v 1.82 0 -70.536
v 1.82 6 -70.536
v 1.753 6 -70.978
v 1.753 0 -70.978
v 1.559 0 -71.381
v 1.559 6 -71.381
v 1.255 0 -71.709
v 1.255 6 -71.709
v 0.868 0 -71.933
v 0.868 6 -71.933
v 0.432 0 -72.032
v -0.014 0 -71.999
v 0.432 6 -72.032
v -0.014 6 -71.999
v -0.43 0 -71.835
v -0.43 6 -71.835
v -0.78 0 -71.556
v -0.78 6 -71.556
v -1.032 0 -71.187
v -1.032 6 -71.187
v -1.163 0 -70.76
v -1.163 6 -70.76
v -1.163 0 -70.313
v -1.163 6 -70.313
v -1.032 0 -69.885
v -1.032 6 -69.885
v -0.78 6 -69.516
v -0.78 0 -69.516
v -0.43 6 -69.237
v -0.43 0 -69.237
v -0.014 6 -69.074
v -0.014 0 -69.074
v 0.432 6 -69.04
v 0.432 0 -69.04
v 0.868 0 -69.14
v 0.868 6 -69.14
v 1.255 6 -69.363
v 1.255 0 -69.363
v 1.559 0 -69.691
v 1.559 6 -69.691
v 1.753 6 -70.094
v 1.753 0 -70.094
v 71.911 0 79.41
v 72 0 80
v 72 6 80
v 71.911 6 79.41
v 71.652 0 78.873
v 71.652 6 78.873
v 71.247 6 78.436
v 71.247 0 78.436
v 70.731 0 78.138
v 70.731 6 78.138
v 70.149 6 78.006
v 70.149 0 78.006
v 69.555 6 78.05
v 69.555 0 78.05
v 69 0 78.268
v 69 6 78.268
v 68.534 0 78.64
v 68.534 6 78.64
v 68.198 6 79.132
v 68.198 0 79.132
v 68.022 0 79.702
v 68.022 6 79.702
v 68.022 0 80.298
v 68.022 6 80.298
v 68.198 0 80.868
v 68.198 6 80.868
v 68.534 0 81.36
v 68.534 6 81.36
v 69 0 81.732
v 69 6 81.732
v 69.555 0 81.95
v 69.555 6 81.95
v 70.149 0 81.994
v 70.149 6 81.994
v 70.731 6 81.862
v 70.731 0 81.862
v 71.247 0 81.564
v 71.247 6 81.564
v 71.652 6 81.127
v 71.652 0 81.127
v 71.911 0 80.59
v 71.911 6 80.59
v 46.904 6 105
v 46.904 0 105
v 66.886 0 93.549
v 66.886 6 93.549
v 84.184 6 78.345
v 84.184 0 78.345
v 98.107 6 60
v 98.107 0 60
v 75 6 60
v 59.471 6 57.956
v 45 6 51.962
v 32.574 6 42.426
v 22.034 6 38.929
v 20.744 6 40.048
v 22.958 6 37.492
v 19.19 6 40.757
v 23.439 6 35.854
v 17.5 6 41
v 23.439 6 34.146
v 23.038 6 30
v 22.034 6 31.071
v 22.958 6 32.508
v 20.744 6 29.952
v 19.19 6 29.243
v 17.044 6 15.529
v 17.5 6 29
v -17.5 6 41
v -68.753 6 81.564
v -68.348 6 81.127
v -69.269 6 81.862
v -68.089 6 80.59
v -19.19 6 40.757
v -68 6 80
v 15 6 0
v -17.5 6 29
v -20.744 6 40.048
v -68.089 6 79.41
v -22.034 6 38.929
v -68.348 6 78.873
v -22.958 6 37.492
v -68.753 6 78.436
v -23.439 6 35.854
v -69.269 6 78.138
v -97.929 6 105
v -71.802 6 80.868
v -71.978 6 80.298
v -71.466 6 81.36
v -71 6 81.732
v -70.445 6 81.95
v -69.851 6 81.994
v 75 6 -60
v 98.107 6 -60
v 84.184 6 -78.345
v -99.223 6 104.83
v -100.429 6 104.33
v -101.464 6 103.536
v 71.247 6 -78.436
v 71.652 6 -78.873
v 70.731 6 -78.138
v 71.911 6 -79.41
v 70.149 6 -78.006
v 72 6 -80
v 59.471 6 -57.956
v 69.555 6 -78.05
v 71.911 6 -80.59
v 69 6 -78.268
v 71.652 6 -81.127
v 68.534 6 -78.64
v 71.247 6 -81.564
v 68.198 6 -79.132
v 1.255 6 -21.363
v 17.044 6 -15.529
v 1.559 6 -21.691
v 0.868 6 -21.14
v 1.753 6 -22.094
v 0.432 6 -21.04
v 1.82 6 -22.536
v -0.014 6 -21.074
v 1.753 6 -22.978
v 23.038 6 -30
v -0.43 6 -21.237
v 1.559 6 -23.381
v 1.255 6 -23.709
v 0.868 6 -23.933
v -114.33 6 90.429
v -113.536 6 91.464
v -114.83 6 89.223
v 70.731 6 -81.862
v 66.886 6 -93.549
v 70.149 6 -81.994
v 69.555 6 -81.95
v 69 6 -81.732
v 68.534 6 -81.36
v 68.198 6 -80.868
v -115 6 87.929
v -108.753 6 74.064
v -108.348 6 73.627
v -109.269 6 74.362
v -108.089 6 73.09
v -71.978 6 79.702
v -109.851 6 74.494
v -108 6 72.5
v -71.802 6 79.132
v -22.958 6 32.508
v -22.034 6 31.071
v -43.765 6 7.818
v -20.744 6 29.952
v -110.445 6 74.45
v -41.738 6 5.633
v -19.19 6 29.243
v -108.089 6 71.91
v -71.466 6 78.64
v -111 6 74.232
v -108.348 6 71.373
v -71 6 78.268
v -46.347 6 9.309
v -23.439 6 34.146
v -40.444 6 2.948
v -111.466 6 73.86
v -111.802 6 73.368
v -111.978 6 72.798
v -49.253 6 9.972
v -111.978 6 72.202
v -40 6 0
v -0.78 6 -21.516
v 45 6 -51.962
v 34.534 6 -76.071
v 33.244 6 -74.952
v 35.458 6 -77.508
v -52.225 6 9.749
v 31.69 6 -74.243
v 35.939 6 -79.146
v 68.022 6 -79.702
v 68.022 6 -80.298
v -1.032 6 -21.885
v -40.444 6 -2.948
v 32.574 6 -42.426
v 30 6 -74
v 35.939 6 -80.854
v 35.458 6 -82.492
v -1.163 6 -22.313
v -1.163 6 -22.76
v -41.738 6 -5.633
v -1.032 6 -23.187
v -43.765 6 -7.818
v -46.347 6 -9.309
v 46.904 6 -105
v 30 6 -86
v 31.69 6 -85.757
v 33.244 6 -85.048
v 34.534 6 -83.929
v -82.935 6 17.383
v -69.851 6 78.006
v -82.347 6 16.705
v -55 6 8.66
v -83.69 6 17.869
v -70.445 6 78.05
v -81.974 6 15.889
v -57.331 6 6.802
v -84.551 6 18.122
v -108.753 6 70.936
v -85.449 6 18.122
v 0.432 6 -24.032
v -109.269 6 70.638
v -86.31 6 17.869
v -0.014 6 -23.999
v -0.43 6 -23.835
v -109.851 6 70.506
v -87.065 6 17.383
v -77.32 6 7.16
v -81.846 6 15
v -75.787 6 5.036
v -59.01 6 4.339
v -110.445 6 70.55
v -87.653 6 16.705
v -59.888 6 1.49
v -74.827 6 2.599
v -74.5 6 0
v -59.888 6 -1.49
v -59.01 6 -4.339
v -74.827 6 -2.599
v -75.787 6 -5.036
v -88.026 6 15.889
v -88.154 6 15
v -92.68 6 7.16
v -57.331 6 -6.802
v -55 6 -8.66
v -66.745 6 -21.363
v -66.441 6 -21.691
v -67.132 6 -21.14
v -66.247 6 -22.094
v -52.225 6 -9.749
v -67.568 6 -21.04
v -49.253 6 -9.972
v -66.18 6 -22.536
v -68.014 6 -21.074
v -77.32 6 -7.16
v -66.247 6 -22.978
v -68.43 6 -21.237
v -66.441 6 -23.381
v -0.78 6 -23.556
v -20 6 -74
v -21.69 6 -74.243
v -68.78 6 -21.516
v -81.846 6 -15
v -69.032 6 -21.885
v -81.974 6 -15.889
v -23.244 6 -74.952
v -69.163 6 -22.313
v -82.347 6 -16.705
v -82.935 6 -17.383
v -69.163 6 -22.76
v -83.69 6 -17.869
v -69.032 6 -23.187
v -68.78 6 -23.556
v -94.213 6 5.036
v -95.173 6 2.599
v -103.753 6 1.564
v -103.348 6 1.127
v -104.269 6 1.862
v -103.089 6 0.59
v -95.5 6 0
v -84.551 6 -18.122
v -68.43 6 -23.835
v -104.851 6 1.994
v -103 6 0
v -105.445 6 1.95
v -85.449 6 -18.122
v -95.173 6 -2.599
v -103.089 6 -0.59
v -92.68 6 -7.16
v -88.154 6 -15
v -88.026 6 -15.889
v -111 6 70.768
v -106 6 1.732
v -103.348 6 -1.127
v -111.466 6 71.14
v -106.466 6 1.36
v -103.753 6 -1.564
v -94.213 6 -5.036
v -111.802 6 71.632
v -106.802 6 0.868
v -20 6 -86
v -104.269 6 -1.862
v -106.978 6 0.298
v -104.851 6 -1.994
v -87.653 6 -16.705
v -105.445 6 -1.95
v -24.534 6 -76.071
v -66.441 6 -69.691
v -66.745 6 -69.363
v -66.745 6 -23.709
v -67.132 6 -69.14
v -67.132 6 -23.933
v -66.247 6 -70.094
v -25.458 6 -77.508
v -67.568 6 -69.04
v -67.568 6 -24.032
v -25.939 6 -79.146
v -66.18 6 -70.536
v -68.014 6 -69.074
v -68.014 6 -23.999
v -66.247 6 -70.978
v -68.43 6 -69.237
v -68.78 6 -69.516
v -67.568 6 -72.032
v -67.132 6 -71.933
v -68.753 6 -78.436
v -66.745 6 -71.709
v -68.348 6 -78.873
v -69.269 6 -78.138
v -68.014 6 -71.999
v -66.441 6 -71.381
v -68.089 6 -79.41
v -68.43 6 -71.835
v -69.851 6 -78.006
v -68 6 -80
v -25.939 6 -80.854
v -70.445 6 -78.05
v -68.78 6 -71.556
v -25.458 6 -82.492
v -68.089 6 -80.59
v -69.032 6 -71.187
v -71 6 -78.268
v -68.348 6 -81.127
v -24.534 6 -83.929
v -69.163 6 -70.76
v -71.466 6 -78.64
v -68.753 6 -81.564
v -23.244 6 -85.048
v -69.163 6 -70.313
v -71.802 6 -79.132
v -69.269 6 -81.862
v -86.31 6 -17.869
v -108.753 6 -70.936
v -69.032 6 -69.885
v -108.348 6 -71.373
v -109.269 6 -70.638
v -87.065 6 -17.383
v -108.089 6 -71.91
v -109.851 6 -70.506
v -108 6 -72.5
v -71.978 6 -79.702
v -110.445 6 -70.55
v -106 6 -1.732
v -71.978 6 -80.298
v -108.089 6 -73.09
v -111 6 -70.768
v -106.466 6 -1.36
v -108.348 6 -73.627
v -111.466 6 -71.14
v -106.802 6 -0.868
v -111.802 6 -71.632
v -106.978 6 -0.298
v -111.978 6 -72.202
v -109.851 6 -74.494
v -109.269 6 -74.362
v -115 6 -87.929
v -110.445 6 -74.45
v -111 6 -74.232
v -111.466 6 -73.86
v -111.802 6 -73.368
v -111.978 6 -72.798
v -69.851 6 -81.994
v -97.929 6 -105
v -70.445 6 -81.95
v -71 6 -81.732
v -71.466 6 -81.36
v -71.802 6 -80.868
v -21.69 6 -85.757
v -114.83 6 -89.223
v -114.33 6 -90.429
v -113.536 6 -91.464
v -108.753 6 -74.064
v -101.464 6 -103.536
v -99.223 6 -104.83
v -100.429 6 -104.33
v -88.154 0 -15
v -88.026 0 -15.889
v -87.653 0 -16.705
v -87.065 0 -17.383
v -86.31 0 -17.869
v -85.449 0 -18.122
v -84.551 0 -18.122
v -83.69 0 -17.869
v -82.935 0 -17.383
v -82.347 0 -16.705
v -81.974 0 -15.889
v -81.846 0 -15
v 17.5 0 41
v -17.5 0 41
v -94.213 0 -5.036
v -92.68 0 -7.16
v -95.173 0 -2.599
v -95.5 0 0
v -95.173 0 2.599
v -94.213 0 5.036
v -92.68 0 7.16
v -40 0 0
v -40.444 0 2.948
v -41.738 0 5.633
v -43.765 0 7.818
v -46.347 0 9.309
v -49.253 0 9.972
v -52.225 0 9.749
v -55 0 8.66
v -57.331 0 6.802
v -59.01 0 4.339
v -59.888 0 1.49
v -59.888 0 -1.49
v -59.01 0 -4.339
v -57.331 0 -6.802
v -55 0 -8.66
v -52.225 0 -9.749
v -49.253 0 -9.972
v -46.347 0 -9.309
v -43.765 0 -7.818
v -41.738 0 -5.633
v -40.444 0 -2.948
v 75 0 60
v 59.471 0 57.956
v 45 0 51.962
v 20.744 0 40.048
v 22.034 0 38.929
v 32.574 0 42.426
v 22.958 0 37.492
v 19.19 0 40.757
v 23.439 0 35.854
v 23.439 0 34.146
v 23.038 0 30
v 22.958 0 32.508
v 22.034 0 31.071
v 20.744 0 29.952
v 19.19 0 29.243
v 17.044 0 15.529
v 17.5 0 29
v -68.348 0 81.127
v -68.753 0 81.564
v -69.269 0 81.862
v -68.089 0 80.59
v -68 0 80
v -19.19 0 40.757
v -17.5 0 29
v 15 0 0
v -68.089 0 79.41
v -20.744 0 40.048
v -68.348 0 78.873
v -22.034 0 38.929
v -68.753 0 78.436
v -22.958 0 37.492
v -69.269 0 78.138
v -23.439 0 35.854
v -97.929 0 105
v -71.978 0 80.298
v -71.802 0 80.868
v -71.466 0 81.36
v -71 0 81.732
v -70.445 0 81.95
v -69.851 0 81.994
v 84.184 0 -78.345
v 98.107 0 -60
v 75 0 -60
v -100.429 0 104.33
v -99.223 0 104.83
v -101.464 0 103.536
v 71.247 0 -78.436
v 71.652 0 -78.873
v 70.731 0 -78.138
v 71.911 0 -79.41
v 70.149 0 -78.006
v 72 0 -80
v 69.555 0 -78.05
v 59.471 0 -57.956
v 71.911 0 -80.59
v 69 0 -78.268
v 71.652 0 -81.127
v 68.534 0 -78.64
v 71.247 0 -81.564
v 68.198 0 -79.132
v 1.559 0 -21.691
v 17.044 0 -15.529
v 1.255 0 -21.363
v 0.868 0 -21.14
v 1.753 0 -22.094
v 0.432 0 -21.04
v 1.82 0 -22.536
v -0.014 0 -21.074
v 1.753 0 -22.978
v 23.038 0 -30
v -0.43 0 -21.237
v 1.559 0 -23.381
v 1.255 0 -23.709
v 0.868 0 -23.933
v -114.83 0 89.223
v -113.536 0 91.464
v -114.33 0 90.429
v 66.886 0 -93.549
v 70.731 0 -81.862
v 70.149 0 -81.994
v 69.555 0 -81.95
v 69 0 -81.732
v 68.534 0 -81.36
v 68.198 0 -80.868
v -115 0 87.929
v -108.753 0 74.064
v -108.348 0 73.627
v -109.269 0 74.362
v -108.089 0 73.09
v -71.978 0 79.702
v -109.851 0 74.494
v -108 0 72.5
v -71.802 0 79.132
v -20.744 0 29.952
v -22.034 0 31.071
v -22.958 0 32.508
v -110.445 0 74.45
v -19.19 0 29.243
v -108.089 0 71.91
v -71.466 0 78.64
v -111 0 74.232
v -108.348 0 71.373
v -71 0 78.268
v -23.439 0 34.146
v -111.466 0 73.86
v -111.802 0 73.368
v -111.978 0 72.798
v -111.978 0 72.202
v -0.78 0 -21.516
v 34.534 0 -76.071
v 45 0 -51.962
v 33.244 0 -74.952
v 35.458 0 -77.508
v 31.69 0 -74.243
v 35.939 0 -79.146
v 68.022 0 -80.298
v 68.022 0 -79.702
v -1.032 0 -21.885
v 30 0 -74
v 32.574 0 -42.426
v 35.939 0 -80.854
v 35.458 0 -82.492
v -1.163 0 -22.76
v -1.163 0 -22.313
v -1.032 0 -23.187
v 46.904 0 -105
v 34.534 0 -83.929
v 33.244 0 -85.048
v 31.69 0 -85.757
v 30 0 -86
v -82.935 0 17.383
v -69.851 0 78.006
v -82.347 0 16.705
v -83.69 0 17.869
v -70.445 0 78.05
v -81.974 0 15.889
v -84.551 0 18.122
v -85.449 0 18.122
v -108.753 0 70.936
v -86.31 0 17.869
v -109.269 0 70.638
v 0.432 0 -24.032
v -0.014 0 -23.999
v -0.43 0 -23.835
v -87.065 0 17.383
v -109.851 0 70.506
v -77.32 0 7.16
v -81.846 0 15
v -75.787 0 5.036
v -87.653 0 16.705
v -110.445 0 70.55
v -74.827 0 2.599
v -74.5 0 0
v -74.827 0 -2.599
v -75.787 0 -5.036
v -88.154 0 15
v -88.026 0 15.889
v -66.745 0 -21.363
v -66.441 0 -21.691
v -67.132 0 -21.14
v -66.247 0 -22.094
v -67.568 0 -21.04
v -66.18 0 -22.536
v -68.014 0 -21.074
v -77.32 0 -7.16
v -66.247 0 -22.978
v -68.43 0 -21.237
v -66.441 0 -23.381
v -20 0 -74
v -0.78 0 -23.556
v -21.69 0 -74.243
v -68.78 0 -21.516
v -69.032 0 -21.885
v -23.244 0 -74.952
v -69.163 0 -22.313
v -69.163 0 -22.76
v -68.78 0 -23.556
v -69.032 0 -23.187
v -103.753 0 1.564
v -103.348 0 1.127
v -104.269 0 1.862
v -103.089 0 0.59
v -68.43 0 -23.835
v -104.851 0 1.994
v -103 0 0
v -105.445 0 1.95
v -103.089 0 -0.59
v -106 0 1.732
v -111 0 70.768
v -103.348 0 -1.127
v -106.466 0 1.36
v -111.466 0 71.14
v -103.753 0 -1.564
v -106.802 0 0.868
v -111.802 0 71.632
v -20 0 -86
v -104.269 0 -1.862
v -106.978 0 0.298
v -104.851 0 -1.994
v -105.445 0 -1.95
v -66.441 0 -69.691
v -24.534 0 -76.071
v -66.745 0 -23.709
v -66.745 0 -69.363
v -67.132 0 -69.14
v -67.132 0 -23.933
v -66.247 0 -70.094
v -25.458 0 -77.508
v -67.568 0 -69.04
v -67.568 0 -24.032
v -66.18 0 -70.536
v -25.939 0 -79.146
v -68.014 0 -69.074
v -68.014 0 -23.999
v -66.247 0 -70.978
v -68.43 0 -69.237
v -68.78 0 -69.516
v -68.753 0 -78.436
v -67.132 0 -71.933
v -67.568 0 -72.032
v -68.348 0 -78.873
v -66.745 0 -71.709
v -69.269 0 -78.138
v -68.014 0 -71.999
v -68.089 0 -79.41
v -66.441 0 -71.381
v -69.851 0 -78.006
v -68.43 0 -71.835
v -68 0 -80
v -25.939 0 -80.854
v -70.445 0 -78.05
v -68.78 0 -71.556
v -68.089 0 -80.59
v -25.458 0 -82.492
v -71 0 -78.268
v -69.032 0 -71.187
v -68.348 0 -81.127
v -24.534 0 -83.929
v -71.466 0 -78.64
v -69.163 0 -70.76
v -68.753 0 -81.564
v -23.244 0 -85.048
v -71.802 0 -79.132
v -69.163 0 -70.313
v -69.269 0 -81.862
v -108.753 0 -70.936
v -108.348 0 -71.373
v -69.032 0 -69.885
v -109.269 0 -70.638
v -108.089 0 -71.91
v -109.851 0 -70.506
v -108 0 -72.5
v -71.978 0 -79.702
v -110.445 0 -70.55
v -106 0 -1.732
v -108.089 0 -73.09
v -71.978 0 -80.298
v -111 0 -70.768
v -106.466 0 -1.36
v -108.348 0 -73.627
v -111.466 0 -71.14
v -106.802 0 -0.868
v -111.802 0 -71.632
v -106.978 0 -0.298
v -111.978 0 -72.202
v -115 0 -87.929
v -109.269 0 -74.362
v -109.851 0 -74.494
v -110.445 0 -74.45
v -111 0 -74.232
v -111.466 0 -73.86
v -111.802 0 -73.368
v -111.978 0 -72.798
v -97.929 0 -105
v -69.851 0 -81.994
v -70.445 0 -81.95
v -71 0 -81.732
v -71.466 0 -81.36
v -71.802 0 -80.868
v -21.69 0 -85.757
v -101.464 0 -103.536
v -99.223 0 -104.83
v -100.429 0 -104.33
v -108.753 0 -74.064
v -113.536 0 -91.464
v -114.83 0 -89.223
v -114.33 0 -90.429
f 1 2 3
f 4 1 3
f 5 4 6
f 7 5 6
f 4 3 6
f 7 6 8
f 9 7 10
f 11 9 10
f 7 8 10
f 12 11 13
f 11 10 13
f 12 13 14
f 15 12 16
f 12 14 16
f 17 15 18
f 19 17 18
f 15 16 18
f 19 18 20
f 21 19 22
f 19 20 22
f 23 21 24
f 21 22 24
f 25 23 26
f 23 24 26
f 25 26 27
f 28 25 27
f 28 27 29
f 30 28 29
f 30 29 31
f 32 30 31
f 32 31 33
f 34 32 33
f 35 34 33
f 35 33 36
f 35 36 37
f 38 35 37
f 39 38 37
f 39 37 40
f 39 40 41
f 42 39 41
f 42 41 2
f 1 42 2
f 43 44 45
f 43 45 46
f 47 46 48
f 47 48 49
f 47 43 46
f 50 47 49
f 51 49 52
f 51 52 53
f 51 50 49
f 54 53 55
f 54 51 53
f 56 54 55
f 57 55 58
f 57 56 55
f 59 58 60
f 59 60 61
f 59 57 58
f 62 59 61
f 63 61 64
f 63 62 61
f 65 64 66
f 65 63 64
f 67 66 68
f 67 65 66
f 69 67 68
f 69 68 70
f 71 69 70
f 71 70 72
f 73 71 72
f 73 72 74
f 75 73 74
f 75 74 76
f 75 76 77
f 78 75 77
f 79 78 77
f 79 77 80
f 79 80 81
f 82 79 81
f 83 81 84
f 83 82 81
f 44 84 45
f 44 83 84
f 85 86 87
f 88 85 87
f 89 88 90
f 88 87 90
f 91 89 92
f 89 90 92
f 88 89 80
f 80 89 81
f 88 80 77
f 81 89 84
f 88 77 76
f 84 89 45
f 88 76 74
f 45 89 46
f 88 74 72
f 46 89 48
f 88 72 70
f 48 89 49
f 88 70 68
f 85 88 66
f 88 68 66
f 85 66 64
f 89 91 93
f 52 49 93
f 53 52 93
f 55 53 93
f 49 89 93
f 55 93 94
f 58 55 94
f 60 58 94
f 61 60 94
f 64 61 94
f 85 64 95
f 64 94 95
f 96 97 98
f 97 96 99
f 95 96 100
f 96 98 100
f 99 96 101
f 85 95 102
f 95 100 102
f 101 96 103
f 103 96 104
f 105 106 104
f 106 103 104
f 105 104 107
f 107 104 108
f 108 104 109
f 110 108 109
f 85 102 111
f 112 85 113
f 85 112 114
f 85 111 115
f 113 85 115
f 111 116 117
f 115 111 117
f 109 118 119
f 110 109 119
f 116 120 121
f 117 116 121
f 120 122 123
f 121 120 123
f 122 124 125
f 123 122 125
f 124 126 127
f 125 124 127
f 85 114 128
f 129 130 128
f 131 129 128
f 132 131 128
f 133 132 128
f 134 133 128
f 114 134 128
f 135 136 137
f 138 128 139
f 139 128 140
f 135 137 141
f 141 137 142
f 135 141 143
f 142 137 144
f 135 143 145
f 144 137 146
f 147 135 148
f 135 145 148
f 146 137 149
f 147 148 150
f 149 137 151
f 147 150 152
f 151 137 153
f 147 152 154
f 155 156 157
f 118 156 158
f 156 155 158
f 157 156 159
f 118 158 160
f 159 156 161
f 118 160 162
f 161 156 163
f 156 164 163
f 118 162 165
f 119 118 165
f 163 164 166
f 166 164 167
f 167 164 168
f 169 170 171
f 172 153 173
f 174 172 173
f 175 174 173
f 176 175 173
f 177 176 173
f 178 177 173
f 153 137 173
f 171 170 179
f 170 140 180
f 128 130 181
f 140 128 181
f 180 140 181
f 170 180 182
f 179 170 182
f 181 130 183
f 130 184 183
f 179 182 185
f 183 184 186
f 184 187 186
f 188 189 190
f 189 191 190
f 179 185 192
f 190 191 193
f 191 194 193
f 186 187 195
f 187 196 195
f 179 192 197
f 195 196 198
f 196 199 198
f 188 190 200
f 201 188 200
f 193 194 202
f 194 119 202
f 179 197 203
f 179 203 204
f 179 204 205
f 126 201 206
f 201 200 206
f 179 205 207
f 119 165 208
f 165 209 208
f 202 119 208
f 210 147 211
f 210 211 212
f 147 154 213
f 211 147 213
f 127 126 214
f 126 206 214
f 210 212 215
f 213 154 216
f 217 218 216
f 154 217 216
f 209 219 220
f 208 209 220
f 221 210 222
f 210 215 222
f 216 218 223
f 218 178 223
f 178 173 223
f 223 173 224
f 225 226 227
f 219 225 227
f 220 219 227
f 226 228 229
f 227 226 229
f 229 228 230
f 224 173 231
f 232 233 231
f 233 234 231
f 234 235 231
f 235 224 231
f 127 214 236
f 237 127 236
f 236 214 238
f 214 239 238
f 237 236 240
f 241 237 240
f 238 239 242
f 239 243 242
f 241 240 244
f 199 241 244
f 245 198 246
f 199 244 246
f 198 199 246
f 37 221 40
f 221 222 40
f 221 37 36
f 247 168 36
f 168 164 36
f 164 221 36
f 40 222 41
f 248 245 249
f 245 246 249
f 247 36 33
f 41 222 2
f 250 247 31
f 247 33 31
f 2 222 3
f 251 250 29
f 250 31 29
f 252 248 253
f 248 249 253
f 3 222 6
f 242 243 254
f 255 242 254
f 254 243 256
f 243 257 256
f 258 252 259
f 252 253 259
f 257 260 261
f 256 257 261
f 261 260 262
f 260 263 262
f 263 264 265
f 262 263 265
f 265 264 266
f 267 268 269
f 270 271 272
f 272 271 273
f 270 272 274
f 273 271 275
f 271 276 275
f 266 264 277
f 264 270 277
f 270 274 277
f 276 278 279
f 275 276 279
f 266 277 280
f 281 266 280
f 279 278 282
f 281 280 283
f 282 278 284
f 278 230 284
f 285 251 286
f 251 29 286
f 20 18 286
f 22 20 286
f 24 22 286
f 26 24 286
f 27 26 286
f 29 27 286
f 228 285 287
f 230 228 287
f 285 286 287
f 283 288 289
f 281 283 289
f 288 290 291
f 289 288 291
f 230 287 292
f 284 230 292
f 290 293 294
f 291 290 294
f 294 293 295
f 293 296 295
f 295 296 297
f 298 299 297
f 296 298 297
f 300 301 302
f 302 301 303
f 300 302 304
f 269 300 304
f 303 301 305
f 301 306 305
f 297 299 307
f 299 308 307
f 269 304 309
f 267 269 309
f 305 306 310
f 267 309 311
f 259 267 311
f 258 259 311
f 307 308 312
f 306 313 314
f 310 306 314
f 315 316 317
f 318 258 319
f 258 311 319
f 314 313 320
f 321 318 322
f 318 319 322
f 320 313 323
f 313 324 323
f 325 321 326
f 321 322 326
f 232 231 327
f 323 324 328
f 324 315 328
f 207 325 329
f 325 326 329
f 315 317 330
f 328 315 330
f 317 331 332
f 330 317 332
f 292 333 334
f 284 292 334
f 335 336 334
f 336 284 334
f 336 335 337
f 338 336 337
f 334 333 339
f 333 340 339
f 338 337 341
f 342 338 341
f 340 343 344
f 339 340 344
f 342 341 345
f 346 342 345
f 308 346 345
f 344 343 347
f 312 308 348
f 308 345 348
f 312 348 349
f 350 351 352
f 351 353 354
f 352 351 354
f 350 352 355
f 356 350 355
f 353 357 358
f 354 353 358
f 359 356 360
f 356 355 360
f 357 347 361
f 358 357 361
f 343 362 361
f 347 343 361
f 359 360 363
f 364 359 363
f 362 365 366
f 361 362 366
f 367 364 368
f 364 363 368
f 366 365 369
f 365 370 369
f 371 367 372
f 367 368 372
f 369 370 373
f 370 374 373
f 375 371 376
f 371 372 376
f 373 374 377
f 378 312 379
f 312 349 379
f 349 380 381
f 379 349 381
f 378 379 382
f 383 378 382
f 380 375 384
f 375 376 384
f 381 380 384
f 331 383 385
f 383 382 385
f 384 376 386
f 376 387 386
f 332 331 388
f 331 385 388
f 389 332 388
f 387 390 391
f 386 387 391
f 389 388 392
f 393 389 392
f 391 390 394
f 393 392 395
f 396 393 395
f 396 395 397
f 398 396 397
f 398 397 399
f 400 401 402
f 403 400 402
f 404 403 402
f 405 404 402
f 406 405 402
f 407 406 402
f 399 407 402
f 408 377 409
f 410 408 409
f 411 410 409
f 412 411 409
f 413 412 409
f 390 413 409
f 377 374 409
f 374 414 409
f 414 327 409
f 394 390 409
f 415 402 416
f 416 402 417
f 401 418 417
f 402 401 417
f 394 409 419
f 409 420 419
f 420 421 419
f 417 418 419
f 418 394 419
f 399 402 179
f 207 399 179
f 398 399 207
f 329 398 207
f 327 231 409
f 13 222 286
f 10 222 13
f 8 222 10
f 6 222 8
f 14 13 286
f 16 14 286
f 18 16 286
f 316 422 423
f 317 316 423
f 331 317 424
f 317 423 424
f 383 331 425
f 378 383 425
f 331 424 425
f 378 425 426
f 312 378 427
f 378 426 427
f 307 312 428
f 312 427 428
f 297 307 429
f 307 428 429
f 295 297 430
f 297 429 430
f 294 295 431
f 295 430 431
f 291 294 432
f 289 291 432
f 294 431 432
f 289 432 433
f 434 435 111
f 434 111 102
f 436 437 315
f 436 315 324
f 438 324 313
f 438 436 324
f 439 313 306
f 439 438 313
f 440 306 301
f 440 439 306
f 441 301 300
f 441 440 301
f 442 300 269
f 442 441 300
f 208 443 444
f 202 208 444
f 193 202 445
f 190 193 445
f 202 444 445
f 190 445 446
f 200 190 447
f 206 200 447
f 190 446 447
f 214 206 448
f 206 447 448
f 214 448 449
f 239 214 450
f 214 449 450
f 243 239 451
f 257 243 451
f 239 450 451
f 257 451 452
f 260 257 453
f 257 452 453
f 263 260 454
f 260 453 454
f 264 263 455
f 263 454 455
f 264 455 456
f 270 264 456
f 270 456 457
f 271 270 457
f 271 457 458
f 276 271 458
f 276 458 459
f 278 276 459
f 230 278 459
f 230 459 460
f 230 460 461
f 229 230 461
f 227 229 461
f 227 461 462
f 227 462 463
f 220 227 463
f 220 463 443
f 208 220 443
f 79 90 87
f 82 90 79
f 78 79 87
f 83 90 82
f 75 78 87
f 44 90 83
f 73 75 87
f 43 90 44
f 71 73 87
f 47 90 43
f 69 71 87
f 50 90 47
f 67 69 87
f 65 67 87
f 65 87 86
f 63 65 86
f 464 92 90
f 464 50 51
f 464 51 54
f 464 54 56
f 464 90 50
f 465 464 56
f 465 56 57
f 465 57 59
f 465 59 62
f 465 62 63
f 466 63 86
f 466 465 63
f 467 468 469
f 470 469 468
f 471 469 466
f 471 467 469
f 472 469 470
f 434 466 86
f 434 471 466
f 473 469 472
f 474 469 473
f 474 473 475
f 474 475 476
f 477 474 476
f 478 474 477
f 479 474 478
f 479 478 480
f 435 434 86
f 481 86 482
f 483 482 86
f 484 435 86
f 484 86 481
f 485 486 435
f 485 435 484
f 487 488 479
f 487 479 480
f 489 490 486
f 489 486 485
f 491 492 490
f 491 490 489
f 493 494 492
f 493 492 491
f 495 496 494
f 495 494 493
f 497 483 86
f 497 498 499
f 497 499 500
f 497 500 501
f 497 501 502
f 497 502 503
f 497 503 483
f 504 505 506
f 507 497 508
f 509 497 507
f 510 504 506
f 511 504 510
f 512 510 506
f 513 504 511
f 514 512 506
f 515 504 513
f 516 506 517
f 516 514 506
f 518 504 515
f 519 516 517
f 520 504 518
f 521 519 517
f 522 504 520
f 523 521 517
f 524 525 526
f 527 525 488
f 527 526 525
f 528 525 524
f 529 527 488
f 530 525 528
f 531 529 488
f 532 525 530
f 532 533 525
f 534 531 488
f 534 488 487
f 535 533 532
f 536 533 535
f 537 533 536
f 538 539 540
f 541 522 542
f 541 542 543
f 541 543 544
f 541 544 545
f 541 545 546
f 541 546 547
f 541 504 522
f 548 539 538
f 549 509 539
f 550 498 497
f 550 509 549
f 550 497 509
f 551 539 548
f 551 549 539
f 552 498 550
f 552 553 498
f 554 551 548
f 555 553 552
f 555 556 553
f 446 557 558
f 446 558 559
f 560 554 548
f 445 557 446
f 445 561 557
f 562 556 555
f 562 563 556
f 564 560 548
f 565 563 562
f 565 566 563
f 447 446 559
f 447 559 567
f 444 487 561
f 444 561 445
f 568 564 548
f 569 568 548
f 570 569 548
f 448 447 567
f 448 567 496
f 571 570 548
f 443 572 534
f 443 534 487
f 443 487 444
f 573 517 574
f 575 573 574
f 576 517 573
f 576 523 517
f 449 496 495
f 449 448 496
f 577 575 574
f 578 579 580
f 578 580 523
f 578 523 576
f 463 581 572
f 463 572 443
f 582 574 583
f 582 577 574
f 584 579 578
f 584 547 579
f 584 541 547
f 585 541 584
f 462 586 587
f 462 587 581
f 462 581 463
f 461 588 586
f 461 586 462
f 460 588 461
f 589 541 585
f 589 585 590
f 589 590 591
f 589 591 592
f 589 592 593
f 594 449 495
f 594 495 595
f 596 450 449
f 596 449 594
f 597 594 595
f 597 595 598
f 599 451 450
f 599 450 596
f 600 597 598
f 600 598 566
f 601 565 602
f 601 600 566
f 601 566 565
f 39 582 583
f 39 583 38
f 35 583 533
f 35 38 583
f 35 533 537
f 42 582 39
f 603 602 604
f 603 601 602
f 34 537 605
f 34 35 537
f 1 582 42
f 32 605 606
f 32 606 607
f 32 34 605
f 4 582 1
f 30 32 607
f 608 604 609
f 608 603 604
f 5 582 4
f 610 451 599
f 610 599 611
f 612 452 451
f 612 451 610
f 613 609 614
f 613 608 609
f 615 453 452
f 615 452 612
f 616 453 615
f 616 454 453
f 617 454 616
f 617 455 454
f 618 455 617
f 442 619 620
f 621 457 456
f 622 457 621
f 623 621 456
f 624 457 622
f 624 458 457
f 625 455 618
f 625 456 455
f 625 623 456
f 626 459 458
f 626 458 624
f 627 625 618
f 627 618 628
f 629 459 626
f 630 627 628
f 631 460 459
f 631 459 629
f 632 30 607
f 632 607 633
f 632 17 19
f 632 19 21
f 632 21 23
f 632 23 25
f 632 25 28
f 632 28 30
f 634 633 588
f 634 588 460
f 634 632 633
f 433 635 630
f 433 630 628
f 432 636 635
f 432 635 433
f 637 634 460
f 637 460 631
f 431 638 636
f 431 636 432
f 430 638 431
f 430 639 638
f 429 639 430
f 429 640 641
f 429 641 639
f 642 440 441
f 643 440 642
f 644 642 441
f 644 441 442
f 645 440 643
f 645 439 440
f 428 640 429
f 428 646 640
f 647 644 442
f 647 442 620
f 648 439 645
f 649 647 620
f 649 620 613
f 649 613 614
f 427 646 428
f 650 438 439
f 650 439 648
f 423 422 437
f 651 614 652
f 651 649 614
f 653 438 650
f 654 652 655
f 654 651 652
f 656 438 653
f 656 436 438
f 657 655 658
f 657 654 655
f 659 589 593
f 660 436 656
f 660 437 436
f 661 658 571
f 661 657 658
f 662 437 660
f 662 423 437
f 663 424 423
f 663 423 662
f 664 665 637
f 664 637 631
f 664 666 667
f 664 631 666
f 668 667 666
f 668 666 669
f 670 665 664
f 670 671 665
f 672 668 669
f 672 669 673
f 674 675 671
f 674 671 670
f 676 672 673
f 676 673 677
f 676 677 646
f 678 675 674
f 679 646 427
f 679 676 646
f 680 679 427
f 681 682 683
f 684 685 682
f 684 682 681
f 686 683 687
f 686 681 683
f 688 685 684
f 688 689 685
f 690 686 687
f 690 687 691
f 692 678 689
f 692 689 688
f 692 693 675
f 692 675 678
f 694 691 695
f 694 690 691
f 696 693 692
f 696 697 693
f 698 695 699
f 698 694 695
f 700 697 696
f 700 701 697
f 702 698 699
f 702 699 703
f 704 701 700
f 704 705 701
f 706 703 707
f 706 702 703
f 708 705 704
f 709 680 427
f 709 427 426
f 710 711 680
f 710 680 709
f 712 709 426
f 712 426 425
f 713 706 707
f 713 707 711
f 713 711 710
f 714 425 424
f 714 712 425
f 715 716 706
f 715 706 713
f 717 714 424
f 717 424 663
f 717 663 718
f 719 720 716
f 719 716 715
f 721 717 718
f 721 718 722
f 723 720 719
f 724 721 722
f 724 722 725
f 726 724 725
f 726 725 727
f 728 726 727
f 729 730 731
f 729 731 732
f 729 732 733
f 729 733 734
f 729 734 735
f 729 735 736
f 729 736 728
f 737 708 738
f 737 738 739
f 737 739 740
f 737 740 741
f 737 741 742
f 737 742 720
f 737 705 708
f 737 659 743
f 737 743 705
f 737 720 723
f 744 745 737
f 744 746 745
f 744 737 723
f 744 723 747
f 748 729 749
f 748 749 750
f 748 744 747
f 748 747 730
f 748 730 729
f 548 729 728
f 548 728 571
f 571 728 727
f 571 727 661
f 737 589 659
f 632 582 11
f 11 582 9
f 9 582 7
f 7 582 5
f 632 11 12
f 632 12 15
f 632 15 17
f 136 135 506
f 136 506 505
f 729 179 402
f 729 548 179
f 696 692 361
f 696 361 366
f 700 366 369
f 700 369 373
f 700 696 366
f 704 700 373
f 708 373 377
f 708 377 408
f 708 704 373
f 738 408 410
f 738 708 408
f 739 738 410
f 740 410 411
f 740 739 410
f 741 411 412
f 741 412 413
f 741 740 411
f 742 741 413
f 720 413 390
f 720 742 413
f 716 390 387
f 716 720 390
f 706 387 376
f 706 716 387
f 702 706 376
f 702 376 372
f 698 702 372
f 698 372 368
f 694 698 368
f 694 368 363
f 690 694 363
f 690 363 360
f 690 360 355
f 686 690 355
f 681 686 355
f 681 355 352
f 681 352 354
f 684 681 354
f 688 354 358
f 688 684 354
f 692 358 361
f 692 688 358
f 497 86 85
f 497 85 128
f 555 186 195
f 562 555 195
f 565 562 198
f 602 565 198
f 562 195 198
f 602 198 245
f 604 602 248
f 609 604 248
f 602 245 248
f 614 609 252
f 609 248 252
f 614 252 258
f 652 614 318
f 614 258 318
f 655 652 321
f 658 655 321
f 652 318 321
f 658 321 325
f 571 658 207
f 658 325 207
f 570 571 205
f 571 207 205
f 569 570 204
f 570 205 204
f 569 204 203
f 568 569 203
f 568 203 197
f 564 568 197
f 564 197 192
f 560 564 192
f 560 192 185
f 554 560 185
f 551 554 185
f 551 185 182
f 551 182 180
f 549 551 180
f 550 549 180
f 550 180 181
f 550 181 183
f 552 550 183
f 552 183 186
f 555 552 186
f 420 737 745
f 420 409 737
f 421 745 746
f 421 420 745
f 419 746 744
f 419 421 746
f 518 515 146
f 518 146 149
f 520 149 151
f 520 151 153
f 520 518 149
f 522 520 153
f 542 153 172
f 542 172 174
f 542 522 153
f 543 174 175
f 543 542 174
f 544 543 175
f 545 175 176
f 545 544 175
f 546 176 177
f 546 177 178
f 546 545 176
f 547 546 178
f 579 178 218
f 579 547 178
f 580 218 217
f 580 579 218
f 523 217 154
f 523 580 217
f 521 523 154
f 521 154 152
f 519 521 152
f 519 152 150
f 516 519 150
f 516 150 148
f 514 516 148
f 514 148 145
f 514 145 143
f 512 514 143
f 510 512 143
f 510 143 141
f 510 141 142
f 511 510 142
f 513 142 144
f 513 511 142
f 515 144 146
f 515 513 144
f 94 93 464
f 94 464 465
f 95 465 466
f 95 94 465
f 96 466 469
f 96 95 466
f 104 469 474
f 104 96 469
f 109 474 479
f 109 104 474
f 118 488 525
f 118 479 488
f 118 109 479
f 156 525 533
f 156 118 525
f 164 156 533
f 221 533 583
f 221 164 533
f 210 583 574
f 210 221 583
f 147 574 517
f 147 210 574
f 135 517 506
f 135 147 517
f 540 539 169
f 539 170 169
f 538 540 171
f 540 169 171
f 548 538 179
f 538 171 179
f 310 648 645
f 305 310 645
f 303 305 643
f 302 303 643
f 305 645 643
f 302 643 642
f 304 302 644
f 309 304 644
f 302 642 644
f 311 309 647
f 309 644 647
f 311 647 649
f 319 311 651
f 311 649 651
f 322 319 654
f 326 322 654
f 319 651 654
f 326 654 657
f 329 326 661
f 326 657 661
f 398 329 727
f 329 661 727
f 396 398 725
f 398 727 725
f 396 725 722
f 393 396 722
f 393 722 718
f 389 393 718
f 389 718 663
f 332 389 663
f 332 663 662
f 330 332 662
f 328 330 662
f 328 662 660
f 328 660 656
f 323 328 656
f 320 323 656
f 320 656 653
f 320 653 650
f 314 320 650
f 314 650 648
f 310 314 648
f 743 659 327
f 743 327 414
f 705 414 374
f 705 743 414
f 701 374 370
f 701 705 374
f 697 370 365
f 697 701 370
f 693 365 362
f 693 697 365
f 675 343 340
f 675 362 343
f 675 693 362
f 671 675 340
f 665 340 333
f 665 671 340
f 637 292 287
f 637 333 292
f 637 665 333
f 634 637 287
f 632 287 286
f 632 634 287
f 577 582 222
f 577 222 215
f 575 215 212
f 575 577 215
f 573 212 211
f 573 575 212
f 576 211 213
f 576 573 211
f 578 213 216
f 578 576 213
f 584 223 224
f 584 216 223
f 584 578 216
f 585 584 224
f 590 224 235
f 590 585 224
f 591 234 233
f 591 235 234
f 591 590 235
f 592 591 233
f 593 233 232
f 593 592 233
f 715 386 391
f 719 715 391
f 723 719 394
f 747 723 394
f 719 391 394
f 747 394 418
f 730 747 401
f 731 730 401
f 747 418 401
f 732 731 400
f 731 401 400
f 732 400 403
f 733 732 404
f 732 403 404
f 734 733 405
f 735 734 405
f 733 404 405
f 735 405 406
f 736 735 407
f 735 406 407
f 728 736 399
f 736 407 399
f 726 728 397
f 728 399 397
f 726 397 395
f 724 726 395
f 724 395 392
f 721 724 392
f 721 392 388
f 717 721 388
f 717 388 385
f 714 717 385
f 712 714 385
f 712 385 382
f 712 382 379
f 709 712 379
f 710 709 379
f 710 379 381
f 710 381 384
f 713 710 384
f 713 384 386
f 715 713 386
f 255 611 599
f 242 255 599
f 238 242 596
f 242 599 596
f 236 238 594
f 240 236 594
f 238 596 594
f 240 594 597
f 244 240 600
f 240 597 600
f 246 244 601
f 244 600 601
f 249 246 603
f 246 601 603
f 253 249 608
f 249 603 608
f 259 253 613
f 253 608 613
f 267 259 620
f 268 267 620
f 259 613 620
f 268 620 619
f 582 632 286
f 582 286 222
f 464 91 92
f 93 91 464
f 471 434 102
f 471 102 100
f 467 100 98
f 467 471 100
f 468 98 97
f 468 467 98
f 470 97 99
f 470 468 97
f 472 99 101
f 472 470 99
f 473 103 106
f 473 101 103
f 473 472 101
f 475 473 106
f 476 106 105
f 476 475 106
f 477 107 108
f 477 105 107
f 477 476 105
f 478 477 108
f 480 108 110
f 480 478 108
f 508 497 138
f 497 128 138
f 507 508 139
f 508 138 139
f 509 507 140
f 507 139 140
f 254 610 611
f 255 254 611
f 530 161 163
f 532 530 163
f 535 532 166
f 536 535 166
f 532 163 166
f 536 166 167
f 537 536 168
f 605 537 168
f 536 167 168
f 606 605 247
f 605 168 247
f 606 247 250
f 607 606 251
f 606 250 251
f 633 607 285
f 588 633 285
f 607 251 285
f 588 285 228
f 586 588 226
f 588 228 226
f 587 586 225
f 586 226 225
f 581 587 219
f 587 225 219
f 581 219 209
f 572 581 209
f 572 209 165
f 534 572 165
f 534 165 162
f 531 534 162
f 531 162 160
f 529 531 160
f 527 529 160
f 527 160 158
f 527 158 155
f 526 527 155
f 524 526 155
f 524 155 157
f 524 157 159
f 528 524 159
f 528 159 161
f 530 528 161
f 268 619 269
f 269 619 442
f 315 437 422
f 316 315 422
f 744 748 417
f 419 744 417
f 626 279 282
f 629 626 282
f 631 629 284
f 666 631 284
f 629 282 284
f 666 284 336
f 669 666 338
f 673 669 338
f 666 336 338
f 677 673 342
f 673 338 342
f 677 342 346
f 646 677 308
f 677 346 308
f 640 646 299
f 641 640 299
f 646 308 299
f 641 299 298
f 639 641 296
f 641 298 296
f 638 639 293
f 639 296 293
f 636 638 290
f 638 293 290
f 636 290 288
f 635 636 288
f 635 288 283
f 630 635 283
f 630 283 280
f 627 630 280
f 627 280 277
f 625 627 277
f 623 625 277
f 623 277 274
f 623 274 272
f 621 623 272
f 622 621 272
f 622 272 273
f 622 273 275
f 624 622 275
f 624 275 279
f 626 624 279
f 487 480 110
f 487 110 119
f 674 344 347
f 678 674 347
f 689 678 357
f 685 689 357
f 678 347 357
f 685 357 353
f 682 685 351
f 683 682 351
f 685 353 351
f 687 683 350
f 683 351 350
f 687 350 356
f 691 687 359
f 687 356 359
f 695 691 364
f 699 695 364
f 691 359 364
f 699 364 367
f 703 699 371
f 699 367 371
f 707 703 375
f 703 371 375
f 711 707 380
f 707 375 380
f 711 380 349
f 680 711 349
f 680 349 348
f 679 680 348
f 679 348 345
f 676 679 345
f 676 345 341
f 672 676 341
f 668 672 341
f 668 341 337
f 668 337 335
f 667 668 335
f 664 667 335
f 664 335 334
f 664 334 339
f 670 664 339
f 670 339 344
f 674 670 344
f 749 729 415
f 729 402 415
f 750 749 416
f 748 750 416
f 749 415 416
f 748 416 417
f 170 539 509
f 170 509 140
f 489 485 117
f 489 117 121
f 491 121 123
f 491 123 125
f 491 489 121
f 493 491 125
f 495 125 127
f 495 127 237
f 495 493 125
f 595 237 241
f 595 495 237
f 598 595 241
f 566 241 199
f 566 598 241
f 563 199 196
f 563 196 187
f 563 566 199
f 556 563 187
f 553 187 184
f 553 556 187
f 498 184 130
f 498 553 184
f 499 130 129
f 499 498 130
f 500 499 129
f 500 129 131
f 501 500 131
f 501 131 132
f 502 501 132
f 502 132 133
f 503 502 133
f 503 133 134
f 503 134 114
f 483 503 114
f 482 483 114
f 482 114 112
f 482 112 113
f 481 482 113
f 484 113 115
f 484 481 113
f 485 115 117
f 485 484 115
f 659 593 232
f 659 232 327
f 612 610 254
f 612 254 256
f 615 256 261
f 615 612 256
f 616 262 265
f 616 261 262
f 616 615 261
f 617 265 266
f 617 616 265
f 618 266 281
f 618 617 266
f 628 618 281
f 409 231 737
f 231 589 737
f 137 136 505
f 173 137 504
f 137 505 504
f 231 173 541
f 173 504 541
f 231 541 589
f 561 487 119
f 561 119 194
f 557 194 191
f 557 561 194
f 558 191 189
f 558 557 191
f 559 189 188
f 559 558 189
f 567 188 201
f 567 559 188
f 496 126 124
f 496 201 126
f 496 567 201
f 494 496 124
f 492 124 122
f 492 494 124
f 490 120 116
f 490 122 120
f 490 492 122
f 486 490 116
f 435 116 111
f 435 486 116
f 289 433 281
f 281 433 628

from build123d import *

# Parameters (mm, degrees)
SKETCH1_R           = 2
SKETCH1_R_2         = 10.5
BOSS_EXTRUDE1_DEPTH = 6
SKETCH2_R           = 10
SKETCH2_R_2         = 2
CUT_EXTRUDE2_DEPTH  = 19
BOSS_EXTRUDE2_DEPTH = 6
CHAMFER1_SIZE       = 15
FILLET1_R           = 5
SKETCH4_R           = 1.5
CUT_EXTRUDE3_DEPTH  = 10
SKETCH5_R           = 2
CUT_EXTRUDE4_DEPTH  = 10


with BuildPart() as part:
    # Sketch1 → Boss-Extrude1 (new body)
    with BuildSketch(Plane(origin=(0, 0, 0), x_dir=(1, 0, 0), z_dir=(0, 1, 0))):
        with BuildLine():
            Line((-46.904157598, -105), (46.904157598, -105))
            ThreePointArc((46.904157598, -105), (115, 0), (46.904157598, 105))
            Line((46.904157598, 105), (-46.904157598, 105))
            ThreePointArc((-46.904157598, 105), (-115, 0), (-46.904157598, -105))
        make_face()
        with Locations((-70, 80)):
            Circle(SKETCH1_R, mode=Mode.SUBTRACT)
        with Locations((70, 80)):
            Circle(SKETCH1_R, mode=Mode.SUBTRACT)
        with Locations((70, -80)):
            Circle(SKETCH1_R, mode=Mode.SUBTRACT)
        with Locations((-70, -80)):
            Circle(SKETCH1_R, mode=Mode.SUBTRACT)
        with Locations((-85, 0)):
            Circle(SKETCH1_R_2, mode=Mode.SUBTRACT)
    extrude(amount=BOSS_EXTRUDE1_DEPTH)

    # Sketch2 → Cut-Extrude2 (cut)
    with BuildSketch(Plane.XZ):
        with Locations((-50, 0)):
            Circle(SKETCH2_R)
        with Locations((-105, 0)):
            Circle(SKETCH2_R_2)
        with BuildLine():
            Line((-88.153729078, 15), (-92.680195826, 7.159929613))
            ThreePointArc((-92.680195826, 7.159929613), (-95.5, 0), (-92.680195826, -7.159929613))
            Line((-92.680195826, -7.159929613), (-88.153729078, -15))
            ThreePointArc((-88.153729078, -15), (-85, -18.153729078), (-81.846270922, -15))
            Line((-81.846270922, -15), (-77.319804174, -7.159929613))
            ThreePointArc((-77.319804174, -7.159929613), (-74.5, 0), (-77.319804174, 7.159929613))
            Line((-77.319804174, 7.159929613), (-81.846270922, 15))
            ThreePointArc((-81.846270922, 15), (-85, 18.153729078), (-88.153729078, 15))
        make_face()
        with BuildLine():
            Line((-20, -74), (30, -74))
            ThreePointArc((30, -74), (36, -80), (30, -86))
            Line((30, -86), (-20, -86))
            ThreePointArc((-20, -86), (-26, -80), (-20, -74))
        make_face()
        with BuildLine():
            Line((17.5, 29), (-17.5, 29))
            ThreePointArc((-17.5, 29), (-23.5, 35), (-17.5, 41))
            Line((-17.5, 41), (17.5, 41))
            ThreePointArc((17.5, 41), (23.5, 35), (17.5, 29))
        make_face()
    extrude(amount=-CUT_EXTRUDE2_DEPTH, mode=Mode.SUBTRACT)

    # Sketch3 → Boss-Extrude2 (add)
    with BuildSketch(Plane(origin=(0, 0, 0), x_dir=(-1, 0, 0), z_dir=(0, -1, 0))):
        with BuildLine():
            ThreePointArc((115, 0), (96.485693561, -62.574043645), (46.904157598, -105))
            Line((46.904157598, -105), (115, -105))
            Line((115, -105), (115, 0))
        make_face()
        with BuildLine():
            ThreePointArc((46.904157598, 105), (96.485693561, 62.574043645), (115, 0))
            Line((115, 0), (115, 105))
            Line((115, 105), (46.904157598, 105))
        make_face()
    extrude(amount=-BOSS_EXTRUDE2_DEPTH)

    # Chamfer1
    chamfer1_edges = [part.edges().sort_by_distance(p)[0] for p in [
        (-115, 3, 105),
        (-115, 3, -105),
    ]]
    chamfer(chamfer1_edges, length=CHAMFER1_SIZE)

    # Fillet1
    fillet1_edges = [part.edges().sort_by_distance(p)[0] for p in [
        (-115, 3, 90),
        (-115, 3, -90),
        (-100, 3, -105),
        (-100, 3, 105),
    ]]
    fillet(fillet1_edges, radius=FILLET1_R)

    # Sketch4 → Cut-Extrude3 (cut)
    with BuildSketch(Plane(origin=(0, 6, 0), x_dir=(1, 0, 0), z_dir=(0, 1, 0))):
        with Locations((0.319804174, 22.536233459)):
            Circle(SKETCH4_R)
        with Locations((-67.680195826, 22.536233459)):
            Circle(SKETCH4_R)
        with Locations((-67.680195826, 70.536233459)):
            Circle(SKETCH4_R)
        with Locations((0.319804174, 70.536233459)):
            Circle(SKETCH4_R)
        with BuildLine():
            Line((115, -60), (75, -60))
            ThreePointArc((75, -60), (15, 0), (75, 60))
            Line((75, 60), (115, 60))
            Line((115, 60), (115, -60))
        make_face()
    extrude(amount=-CUT_EXTRUDE3_DEPTH, mode=Mode.SUBTRACT)

    # Sketch5 → Cut-Extrude4 (cut)
    with BuildSketch(Plane(origin=(0, 6, 0), x_dir=(1, 0, 0), z_dir=(0, 1, 0))):
        with Locations((-110, -72.5)):
            Circle(SKETCH5_R)
        with Locations((-110, 72.5)):
            Circle(SKETCH5_R)
    extrude(amount=-CUT_EXTRUDE4_DEPTH, mode=Mode.SUBTRACT)


solid = part.part
